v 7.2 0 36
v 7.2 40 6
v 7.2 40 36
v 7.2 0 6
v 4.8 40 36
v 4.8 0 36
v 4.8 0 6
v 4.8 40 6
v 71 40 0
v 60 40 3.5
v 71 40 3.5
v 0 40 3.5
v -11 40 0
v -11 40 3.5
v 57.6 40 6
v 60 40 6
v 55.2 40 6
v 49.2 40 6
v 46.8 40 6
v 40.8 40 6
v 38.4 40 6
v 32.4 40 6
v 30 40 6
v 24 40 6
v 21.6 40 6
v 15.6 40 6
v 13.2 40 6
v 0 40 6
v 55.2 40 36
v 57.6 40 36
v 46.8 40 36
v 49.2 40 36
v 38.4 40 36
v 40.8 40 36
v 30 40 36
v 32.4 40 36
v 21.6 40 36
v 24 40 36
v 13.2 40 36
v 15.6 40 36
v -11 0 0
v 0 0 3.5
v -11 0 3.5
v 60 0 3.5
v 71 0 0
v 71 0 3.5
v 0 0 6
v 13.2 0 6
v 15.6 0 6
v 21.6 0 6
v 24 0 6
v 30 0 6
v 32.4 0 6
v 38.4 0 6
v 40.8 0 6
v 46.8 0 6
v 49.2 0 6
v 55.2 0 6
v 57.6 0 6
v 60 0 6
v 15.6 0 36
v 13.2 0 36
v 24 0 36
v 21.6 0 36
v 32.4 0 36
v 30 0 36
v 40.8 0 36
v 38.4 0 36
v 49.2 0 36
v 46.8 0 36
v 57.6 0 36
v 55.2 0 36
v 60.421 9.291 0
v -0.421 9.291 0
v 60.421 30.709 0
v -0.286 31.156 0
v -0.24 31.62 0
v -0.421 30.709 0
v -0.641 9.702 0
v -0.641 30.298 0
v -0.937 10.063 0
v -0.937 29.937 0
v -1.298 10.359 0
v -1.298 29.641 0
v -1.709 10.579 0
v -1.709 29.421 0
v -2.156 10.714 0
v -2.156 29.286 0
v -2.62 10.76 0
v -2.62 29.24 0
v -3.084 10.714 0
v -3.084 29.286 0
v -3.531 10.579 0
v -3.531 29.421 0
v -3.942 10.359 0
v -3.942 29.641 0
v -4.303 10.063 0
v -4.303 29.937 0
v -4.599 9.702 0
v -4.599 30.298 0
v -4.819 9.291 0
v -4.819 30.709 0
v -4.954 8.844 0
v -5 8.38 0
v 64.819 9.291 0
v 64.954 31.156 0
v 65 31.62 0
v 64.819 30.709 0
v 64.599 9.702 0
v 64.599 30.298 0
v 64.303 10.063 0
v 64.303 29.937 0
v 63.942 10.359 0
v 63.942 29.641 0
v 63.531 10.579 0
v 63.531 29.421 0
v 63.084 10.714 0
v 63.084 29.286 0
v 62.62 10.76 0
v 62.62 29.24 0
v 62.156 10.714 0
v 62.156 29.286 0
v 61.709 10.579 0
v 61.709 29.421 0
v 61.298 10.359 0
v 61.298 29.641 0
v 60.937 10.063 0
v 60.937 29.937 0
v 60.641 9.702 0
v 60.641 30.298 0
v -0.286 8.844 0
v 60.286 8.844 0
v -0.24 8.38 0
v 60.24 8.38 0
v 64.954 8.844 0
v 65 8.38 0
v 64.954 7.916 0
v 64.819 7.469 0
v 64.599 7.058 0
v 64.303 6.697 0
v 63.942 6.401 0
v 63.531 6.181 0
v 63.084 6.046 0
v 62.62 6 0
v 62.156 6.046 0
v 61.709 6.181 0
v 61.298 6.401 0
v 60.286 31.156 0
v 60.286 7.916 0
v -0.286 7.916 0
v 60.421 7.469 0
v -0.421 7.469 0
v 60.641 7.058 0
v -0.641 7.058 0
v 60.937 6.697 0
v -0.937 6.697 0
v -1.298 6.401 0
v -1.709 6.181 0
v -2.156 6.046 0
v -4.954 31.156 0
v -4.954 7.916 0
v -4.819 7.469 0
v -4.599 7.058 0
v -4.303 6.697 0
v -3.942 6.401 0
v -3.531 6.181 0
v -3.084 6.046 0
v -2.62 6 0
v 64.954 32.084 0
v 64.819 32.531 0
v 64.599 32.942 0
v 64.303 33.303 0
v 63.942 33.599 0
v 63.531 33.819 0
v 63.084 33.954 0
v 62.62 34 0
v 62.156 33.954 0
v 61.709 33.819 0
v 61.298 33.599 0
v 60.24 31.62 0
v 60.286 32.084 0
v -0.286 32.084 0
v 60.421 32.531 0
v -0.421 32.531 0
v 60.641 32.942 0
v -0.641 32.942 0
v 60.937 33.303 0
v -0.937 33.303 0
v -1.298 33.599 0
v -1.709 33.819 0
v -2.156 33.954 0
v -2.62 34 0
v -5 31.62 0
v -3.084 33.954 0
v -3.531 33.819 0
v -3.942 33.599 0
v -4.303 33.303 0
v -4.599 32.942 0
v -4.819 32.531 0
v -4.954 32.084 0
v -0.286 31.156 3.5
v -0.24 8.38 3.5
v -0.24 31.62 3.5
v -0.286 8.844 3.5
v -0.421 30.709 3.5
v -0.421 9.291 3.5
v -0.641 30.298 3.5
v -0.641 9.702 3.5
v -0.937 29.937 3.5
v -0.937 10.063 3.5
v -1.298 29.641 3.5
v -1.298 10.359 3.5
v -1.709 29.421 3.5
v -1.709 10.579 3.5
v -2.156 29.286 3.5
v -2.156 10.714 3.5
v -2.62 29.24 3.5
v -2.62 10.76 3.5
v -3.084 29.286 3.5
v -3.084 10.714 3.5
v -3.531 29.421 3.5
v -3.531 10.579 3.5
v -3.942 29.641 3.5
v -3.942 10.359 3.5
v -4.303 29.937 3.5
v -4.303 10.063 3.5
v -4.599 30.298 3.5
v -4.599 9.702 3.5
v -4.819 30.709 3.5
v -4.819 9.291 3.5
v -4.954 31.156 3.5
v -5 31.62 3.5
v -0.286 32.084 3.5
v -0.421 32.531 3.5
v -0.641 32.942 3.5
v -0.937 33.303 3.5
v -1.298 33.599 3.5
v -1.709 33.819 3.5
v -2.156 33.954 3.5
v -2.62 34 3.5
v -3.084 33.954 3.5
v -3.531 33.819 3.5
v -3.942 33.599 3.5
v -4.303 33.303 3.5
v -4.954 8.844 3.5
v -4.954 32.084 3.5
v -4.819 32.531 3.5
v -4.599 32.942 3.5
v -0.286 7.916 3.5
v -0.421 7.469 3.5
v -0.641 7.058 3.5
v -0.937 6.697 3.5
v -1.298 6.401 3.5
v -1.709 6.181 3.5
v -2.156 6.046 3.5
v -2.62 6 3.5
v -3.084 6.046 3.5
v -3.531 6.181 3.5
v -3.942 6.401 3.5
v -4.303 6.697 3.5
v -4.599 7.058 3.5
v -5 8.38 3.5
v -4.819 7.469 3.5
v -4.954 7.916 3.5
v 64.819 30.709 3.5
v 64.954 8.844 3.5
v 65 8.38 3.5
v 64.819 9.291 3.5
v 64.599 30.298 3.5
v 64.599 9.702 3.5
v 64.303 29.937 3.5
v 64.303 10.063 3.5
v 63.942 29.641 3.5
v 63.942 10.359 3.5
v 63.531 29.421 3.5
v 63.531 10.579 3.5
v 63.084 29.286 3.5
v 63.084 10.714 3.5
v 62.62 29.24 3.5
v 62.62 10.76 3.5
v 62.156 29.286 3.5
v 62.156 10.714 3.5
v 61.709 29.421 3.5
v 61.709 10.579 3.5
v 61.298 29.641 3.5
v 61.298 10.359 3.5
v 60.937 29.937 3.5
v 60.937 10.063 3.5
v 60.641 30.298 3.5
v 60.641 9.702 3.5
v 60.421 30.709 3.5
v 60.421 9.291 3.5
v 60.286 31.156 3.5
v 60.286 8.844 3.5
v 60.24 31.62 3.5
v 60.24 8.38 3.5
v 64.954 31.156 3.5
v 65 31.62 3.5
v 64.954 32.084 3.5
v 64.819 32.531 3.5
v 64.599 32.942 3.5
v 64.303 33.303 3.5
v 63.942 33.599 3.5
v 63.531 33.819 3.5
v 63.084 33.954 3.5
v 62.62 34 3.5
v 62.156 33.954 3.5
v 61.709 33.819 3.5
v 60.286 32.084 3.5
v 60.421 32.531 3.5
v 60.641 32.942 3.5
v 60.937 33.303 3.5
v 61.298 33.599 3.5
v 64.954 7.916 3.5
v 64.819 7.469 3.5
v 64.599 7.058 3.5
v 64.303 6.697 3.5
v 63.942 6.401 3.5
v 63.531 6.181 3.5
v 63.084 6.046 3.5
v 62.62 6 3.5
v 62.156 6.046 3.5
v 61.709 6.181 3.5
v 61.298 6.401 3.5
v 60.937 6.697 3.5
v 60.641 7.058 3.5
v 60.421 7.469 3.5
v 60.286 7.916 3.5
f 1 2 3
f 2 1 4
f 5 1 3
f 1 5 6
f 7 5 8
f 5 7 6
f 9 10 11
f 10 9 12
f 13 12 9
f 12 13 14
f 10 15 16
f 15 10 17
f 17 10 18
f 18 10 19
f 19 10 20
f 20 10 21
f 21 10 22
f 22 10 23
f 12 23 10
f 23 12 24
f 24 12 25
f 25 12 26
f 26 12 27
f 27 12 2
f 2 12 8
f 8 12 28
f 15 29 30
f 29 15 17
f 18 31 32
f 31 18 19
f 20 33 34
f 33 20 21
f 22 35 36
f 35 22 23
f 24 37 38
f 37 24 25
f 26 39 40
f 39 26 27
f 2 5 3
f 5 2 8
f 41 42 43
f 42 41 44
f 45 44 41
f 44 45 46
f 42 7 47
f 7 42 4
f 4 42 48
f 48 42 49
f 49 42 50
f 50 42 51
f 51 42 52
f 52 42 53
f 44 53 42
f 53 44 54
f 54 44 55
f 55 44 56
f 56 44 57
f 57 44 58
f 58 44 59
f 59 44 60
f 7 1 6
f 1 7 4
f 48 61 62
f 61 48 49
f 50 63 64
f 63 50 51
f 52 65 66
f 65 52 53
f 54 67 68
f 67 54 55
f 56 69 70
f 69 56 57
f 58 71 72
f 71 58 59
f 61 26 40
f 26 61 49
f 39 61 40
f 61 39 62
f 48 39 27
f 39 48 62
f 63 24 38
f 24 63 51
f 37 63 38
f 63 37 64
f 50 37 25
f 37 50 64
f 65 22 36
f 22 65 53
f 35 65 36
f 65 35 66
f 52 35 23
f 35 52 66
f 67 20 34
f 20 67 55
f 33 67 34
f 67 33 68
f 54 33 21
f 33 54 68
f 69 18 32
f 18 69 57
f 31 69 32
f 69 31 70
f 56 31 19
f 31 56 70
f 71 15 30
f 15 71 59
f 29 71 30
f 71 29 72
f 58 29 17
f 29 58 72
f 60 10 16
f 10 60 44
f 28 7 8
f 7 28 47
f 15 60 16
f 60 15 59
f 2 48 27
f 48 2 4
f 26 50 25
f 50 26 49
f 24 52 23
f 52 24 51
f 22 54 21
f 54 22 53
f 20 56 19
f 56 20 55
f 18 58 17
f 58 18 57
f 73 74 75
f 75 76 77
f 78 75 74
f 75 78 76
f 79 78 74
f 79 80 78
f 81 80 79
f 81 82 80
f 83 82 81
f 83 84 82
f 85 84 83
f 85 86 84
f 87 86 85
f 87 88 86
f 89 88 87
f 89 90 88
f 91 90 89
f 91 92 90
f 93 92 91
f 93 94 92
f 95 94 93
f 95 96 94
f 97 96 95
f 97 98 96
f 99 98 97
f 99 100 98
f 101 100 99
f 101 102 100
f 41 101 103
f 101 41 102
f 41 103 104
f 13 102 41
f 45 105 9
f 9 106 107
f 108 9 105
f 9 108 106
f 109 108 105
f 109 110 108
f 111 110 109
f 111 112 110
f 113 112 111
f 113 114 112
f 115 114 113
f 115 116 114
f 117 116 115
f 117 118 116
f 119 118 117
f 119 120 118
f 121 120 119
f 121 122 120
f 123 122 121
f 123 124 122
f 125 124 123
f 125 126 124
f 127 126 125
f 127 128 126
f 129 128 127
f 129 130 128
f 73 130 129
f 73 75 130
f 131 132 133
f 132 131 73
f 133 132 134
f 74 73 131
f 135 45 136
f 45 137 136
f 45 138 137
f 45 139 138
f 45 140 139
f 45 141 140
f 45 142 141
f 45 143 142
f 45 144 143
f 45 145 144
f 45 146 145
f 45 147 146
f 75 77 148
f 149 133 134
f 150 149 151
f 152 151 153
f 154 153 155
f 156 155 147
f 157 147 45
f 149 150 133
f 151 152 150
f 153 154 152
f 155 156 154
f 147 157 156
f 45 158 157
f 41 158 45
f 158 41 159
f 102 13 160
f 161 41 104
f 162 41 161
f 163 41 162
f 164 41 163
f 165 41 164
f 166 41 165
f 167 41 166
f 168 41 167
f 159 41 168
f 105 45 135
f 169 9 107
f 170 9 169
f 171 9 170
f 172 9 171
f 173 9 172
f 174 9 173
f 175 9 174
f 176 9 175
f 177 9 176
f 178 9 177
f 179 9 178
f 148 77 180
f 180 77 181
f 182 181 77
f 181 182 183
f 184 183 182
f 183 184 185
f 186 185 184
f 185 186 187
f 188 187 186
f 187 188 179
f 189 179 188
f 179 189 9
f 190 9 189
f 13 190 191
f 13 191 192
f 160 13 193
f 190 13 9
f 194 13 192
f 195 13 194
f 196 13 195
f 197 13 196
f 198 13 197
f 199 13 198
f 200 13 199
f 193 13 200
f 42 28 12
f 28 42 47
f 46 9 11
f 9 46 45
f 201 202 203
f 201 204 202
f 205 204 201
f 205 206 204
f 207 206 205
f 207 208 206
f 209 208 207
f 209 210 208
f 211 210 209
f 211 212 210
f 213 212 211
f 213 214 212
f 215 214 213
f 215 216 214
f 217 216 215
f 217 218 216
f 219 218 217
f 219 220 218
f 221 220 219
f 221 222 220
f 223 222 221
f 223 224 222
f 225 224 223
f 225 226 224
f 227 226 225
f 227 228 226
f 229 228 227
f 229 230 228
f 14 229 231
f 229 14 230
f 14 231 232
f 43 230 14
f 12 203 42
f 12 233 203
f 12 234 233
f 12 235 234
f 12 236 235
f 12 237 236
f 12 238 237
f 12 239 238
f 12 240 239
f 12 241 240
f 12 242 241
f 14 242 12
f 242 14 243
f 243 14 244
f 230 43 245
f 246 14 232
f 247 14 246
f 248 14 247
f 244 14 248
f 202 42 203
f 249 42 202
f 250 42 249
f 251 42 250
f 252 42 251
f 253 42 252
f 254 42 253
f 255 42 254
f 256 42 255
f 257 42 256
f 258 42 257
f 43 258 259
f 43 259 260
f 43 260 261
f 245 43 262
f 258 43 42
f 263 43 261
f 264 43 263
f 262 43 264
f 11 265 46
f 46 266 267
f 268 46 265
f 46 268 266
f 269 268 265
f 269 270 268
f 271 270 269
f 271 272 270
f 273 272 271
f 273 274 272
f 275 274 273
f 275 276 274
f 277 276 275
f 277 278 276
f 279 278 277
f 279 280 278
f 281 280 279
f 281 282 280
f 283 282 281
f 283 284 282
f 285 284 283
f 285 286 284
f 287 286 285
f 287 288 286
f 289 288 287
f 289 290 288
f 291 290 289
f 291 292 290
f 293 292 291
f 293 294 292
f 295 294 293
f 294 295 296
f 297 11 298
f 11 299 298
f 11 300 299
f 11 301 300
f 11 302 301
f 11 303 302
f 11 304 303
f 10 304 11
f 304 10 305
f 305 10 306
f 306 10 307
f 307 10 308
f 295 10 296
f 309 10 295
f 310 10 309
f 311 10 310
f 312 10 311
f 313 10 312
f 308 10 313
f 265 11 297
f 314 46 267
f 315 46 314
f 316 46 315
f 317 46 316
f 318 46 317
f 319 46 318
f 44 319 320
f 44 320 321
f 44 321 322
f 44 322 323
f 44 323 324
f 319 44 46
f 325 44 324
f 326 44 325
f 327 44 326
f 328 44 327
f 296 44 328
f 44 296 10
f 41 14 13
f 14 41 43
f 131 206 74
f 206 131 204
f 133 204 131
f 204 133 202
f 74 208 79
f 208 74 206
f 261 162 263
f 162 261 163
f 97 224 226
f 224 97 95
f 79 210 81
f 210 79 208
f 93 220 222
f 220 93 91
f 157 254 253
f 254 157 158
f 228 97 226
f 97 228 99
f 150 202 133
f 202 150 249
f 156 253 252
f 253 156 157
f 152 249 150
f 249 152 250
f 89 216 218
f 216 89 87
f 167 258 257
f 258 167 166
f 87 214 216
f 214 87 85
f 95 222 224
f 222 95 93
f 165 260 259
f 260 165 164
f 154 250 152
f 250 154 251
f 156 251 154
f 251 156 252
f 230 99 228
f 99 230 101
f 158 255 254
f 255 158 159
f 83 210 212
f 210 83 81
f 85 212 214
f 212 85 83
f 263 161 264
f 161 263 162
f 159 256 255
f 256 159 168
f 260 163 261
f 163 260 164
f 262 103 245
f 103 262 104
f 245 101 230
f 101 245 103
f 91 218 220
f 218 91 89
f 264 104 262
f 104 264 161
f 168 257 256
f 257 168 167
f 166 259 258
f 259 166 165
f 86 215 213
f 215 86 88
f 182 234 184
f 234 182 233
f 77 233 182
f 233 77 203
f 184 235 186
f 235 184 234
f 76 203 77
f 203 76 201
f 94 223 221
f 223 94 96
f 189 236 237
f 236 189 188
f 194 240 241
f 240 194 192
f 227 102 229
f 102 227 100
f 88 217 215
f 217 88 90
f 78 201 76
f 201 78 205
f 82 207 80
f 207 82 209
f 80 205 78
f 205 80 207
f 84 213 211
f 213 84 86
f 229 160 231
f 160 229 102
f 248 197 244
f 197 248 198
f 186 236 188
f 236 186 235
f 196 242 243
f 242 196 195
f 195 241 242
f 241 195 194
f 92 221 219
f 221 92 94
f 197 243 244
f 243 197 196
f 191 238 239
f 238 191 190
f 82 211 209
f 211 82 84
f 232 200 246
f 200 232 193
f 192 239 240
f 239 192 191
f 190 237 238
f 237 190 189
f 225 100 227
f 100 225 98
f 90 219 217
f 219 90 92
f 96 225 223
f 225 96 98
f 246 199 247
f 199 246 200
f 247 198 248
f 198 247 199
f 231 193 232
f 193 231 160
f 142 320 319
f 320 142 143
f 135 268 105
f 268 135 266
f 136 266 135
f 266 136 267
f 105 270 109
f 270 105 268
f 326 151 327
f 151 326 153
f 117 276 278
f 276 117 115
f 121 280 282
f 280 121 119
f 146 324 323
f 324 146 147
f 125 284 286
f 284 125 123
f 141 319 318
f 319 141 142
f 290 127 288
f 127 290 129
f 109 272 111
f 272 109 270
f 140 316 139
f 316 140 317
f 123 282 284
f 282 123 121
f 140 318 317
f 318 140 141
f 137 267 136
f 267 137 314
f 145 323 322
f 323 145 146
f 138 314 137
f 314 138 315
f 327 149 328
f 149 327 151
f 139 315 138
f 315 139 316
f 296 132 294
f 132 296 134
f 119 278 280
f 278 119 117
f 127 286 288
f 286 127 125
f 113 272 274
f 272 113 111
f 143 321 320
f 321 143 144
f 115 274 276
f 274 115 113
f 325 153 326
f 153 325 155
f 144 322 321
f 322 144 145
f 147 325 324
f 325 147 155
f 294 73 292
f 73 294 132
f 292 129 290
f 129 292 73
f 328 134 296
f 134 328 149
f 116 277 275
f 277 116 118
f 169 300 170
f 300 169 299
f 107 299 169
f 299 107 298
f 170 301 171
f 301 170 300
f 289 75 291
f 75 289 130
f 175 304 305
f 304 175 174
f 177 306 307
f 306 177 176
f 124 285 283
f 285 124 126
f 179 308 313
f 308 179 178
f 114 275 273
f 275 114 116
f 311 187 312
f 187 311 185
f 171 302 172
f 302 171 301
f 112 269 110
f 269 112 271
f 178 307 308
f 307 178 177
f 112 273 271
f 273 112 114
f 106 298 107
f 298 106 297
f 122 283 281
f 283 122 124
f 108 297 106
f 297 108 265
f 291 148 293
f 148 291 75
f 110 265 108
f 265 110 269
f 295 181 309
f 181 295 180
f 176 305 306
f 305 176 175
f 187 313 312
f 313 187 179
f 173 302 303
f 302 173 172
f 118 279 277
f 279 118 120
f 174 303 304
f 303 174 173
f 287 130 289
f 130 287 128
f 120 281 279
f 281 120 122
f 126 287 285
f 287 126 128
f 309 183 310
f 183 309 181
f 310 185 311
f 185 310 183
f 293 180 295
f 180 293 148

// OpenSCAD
$fn = 32;

// ----------------------------------------------------------------------
// Finned heat sink: 60 x 40 mm base, 30 mm fins
// ----------------------------------------------------------------------

// --- parameters (mm) ---
base_w = 60;              // base width
base_d = 40;              // base depth
base_t = 6;               // base thickness
fin_h = 30;               // fin height above the base
holes_d = 4.76;           // fixing holes
hole_x = 32.62;           // hole offset in x
hole_y = 11.62;           // hole offset in y
fin_t = 2.4;              // fin thickness
fin_pitch = 8.4;          // fin pitch
fin_count = 7;            // number of fins
fin_x0 = 4.8;             // first fin offset
flange_w = 82;            // flange plate width
flange_t = 3;             // flange plate thickness

difference() {
  union() {
    cube([base_w, base_d, base_t]);
    for (i = [0 : fin_count - 1]) {
      translate([fin_x0 + i * fin_pitch, 0, base_t - 0.5]) cube([fin_t, base_d, fin_h + 0.5]);
    }
    /* mounting flange, a wider plate sharing the base bottom */
    translate([(base_w - flange_w) / 2, 0, 0]) cube([flange_w, base_d, flange_t + 0.5]);
  }
  /* fixing holes through the base, 2.5 mm clear on both sides */
  for (hx = [-32.62, 32.62]) {
    for (hy = [-11.62, 11.62]) {
      translate([base_w / 2 + hx, base_d / 2 + hy, -2.5]) cylinder(h = base_t + 5, d = holes_d);
    }
  }
}
